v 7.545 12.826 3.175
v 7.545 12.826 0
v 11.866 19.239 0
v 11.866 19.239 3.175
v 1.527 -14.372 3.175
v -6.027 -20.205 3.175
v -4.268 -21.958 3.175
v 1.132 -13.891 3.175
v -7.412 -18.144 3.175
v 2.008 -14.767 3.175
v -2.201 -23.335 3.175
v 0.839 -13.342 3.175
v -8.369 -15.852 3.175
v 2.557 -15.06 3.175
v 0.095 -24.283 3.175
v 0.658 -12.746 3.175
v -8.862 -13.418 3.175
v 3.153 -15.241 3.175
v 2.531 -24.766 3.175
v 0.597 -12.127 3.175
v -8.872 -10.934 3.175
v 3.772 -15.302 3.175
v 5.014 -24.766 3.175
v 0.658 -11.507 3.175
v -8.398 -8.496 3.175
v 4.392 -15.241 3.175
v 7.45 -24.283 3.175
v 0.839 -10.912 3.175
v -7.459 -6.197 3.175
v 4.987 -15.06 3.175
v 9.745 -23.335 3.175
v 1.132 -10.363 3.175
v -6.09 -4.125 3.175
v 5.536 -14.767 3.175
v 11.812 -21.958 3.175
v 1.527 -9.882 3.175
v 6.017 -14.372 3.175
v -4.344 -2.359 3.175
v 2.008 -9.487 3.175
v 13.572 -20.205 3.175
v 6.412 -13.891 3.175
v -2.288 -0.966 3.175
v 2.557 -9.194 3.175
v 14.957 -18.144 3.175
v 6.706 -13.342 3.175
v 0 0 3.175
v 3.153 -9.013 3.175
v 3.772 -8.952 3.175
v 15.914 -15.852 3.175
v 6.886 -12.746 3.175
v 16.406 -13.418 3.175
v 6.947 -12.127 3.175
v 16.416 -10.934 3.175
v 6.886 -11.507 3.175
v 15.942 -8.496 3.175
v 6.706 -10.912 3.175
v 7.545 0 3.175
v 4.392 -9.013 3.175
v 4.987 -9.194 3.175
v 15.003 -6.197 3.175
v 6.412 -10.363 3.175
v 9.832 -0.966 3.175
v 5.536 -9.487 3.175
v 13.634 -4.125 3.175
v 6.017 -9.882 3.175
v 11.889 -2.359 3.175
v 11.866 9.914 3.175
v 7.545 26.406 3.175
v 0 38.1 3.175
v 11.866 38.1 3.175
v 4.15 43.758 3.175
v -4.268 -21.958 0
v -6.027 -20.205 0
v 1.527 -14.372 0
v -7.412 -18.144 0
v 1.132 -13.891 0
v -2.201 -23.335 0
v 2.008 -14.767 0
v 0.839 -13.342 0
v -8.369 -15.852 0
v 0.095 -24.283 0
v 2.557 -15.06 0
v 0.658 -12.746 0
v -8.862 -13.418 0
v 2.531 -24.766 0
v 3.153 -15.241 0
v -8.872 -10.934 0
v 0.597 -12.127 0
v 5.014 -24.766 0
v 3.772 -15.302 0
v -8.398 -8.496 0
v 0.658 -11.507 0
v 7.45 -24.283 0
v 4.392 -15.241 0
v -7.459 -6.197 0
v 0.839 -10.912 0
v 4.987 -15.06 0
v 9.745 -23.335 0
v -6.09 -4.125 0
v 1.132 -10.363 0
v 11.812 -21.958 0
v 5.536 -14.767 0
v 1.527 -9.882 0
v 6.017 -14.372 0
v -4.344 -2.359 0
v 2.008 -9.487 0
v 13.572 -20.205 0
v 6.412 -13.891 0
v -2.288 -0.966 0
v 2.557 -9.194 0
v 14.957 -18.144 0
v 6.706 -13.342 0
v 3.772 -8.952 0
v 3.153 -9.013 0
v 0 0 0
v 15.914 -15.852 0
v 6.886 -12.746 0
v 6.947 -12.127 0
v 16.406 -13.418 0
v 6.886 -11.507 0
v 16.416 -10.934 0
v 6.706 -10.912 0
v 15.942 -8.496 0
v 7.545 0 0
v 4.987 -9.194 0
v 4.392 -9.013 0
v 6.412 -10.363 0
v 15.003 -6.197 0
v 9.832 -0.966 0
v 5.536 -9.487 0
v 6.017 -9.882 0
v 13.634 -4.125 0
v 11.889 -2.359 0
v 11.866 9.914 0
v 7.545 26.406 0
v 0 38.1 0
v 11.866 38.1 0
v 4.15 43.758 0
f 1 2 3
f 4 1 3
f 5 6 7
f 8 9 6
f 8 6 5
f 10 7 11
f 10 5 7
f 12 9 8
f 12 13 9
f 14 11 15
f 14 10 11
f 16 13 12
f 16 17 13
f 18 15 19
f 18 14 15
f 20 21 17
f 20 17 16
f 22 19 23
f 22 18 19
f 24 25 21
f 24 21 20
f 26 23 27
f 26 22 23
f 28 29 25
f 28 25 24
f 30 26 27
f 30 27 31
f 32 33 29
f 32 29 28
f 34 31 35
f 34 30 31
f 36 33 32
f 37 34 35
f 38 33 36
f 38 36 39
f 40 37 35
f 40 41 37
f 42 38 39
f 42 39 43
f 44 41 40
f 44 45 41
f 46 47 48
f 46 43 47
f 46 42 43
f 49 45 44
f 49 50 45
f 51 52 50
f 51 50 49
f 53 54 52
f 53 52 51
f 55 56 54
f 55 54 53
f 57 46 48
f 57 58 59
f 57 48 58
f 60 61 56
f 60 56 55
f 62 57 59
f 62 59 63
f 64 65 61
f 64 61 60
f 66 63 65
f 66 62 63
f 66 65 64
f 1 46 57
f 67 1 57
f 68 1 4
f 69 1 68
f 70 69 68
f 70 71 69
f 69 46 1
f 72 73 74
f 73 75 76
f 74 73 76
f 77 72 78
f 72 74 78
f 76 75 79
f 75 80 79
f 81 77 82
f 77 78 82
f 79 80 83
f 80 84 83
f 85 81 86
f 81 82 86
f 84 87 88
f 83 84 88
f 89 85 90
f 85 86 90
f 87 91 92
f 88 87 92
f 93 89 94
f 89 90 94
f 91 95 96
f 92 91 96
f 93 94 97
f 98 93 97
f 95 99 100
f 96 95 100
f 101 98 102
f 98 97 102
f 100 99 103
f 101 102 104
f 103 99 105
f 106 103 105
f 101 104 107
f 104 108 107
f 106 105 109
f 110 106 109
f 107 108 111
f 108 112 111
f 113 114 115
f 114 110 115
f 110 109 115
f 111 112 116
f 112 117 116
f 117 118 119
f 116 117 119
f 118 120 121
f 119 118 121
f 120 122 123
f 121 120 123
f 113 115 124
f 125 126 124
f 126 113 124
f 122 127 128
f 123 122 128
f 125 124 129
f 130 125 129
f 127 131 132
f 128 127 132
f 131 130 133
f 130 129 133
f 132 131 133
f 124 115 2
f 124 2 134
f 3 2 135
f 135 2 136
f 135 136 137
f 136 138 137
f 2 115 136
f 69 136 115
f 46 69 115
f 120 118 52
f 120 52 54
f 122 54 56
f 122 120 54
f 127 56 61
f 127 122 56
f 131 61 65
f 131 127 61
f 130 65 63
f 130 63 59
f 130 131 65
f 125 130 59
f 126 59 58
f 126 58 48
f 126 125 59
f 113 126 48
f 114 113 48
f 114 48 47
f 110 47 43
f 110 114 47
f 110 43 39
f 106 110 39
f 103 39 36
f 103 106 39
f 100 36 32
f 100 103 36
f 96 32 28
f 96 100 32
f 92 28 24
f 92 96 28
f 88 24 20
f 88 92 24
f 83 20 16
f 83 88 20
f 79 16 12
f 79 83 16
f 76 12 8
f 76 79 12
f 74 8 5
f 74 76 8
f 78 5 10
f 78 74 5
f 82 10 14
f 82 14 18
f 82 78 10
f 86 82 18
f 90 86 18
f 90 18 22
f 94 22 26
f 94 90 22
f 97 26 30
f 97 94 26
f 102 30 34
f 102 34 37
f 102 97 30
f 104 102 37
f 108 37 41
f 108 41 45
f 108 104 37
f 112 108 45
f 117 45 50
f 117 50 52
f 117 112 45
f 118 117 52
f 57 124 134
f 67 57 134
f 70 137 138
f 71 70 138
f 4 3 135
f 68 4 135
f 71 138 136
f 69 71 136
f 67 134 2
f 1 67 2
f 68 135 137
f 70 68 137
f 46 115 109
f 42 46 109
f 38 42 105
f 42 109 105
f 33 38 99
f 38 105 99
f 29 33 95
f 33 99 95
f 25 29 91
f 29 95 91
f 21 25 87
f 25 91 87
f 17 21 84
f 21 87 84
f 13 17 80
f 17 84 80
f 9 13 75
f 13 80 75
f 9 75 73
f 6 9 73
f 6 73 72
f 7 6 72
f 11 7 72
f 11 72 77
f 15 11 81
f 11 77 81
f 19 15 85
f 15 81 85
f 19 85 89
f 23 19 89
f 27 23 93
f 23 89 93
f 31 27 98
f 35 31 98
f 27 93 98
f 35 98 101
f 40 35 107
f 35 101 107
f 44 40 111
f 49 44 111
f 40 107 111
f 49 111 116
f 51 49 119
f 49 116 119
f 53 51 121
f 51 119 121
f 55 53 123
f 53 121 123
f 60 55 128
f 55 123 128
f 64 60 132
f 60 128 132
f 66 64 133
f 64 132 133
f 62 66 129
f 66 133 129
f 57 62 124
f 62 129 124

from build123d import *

# Parameters (mm, degrees)
F0_R     = 3.175
F1_DEPTH = 3.175


with BuildPart() as f1:
    # F0 (on Top) → F1 (new body)
    with BuildSketch(Plane.XY):
        with BuildLine():
            Line((0, 38.1), (0, 0))
            ThreePointArc((0, 0), (3.772278, -24.826826), (7.544557, 0))
            Line((7.544557, 0), (11.865513, 9.914308))
            Line((11.865513, 9.914308), (7.544557, 12.825744))
            Line((7.544557, 12.825744), (11.865513, 19.238615))
            Line((11.865513, 19.238615), (7.544557, 26.40594))
            Line((7.544557, 26.40594), (11.865513, 38.1))
            Line((11.865513, 38.1), (4.149509, 43.758412))
            Line((4.149509, 43.758412), (0, 38.1))
        make_face()
        with Locations((3.772278, -12.126826)):
            Circle(F0_R, mode=Mode.SUBTRACT)
    extrude(amount=F1_DEPTH)


solid = f1.part
